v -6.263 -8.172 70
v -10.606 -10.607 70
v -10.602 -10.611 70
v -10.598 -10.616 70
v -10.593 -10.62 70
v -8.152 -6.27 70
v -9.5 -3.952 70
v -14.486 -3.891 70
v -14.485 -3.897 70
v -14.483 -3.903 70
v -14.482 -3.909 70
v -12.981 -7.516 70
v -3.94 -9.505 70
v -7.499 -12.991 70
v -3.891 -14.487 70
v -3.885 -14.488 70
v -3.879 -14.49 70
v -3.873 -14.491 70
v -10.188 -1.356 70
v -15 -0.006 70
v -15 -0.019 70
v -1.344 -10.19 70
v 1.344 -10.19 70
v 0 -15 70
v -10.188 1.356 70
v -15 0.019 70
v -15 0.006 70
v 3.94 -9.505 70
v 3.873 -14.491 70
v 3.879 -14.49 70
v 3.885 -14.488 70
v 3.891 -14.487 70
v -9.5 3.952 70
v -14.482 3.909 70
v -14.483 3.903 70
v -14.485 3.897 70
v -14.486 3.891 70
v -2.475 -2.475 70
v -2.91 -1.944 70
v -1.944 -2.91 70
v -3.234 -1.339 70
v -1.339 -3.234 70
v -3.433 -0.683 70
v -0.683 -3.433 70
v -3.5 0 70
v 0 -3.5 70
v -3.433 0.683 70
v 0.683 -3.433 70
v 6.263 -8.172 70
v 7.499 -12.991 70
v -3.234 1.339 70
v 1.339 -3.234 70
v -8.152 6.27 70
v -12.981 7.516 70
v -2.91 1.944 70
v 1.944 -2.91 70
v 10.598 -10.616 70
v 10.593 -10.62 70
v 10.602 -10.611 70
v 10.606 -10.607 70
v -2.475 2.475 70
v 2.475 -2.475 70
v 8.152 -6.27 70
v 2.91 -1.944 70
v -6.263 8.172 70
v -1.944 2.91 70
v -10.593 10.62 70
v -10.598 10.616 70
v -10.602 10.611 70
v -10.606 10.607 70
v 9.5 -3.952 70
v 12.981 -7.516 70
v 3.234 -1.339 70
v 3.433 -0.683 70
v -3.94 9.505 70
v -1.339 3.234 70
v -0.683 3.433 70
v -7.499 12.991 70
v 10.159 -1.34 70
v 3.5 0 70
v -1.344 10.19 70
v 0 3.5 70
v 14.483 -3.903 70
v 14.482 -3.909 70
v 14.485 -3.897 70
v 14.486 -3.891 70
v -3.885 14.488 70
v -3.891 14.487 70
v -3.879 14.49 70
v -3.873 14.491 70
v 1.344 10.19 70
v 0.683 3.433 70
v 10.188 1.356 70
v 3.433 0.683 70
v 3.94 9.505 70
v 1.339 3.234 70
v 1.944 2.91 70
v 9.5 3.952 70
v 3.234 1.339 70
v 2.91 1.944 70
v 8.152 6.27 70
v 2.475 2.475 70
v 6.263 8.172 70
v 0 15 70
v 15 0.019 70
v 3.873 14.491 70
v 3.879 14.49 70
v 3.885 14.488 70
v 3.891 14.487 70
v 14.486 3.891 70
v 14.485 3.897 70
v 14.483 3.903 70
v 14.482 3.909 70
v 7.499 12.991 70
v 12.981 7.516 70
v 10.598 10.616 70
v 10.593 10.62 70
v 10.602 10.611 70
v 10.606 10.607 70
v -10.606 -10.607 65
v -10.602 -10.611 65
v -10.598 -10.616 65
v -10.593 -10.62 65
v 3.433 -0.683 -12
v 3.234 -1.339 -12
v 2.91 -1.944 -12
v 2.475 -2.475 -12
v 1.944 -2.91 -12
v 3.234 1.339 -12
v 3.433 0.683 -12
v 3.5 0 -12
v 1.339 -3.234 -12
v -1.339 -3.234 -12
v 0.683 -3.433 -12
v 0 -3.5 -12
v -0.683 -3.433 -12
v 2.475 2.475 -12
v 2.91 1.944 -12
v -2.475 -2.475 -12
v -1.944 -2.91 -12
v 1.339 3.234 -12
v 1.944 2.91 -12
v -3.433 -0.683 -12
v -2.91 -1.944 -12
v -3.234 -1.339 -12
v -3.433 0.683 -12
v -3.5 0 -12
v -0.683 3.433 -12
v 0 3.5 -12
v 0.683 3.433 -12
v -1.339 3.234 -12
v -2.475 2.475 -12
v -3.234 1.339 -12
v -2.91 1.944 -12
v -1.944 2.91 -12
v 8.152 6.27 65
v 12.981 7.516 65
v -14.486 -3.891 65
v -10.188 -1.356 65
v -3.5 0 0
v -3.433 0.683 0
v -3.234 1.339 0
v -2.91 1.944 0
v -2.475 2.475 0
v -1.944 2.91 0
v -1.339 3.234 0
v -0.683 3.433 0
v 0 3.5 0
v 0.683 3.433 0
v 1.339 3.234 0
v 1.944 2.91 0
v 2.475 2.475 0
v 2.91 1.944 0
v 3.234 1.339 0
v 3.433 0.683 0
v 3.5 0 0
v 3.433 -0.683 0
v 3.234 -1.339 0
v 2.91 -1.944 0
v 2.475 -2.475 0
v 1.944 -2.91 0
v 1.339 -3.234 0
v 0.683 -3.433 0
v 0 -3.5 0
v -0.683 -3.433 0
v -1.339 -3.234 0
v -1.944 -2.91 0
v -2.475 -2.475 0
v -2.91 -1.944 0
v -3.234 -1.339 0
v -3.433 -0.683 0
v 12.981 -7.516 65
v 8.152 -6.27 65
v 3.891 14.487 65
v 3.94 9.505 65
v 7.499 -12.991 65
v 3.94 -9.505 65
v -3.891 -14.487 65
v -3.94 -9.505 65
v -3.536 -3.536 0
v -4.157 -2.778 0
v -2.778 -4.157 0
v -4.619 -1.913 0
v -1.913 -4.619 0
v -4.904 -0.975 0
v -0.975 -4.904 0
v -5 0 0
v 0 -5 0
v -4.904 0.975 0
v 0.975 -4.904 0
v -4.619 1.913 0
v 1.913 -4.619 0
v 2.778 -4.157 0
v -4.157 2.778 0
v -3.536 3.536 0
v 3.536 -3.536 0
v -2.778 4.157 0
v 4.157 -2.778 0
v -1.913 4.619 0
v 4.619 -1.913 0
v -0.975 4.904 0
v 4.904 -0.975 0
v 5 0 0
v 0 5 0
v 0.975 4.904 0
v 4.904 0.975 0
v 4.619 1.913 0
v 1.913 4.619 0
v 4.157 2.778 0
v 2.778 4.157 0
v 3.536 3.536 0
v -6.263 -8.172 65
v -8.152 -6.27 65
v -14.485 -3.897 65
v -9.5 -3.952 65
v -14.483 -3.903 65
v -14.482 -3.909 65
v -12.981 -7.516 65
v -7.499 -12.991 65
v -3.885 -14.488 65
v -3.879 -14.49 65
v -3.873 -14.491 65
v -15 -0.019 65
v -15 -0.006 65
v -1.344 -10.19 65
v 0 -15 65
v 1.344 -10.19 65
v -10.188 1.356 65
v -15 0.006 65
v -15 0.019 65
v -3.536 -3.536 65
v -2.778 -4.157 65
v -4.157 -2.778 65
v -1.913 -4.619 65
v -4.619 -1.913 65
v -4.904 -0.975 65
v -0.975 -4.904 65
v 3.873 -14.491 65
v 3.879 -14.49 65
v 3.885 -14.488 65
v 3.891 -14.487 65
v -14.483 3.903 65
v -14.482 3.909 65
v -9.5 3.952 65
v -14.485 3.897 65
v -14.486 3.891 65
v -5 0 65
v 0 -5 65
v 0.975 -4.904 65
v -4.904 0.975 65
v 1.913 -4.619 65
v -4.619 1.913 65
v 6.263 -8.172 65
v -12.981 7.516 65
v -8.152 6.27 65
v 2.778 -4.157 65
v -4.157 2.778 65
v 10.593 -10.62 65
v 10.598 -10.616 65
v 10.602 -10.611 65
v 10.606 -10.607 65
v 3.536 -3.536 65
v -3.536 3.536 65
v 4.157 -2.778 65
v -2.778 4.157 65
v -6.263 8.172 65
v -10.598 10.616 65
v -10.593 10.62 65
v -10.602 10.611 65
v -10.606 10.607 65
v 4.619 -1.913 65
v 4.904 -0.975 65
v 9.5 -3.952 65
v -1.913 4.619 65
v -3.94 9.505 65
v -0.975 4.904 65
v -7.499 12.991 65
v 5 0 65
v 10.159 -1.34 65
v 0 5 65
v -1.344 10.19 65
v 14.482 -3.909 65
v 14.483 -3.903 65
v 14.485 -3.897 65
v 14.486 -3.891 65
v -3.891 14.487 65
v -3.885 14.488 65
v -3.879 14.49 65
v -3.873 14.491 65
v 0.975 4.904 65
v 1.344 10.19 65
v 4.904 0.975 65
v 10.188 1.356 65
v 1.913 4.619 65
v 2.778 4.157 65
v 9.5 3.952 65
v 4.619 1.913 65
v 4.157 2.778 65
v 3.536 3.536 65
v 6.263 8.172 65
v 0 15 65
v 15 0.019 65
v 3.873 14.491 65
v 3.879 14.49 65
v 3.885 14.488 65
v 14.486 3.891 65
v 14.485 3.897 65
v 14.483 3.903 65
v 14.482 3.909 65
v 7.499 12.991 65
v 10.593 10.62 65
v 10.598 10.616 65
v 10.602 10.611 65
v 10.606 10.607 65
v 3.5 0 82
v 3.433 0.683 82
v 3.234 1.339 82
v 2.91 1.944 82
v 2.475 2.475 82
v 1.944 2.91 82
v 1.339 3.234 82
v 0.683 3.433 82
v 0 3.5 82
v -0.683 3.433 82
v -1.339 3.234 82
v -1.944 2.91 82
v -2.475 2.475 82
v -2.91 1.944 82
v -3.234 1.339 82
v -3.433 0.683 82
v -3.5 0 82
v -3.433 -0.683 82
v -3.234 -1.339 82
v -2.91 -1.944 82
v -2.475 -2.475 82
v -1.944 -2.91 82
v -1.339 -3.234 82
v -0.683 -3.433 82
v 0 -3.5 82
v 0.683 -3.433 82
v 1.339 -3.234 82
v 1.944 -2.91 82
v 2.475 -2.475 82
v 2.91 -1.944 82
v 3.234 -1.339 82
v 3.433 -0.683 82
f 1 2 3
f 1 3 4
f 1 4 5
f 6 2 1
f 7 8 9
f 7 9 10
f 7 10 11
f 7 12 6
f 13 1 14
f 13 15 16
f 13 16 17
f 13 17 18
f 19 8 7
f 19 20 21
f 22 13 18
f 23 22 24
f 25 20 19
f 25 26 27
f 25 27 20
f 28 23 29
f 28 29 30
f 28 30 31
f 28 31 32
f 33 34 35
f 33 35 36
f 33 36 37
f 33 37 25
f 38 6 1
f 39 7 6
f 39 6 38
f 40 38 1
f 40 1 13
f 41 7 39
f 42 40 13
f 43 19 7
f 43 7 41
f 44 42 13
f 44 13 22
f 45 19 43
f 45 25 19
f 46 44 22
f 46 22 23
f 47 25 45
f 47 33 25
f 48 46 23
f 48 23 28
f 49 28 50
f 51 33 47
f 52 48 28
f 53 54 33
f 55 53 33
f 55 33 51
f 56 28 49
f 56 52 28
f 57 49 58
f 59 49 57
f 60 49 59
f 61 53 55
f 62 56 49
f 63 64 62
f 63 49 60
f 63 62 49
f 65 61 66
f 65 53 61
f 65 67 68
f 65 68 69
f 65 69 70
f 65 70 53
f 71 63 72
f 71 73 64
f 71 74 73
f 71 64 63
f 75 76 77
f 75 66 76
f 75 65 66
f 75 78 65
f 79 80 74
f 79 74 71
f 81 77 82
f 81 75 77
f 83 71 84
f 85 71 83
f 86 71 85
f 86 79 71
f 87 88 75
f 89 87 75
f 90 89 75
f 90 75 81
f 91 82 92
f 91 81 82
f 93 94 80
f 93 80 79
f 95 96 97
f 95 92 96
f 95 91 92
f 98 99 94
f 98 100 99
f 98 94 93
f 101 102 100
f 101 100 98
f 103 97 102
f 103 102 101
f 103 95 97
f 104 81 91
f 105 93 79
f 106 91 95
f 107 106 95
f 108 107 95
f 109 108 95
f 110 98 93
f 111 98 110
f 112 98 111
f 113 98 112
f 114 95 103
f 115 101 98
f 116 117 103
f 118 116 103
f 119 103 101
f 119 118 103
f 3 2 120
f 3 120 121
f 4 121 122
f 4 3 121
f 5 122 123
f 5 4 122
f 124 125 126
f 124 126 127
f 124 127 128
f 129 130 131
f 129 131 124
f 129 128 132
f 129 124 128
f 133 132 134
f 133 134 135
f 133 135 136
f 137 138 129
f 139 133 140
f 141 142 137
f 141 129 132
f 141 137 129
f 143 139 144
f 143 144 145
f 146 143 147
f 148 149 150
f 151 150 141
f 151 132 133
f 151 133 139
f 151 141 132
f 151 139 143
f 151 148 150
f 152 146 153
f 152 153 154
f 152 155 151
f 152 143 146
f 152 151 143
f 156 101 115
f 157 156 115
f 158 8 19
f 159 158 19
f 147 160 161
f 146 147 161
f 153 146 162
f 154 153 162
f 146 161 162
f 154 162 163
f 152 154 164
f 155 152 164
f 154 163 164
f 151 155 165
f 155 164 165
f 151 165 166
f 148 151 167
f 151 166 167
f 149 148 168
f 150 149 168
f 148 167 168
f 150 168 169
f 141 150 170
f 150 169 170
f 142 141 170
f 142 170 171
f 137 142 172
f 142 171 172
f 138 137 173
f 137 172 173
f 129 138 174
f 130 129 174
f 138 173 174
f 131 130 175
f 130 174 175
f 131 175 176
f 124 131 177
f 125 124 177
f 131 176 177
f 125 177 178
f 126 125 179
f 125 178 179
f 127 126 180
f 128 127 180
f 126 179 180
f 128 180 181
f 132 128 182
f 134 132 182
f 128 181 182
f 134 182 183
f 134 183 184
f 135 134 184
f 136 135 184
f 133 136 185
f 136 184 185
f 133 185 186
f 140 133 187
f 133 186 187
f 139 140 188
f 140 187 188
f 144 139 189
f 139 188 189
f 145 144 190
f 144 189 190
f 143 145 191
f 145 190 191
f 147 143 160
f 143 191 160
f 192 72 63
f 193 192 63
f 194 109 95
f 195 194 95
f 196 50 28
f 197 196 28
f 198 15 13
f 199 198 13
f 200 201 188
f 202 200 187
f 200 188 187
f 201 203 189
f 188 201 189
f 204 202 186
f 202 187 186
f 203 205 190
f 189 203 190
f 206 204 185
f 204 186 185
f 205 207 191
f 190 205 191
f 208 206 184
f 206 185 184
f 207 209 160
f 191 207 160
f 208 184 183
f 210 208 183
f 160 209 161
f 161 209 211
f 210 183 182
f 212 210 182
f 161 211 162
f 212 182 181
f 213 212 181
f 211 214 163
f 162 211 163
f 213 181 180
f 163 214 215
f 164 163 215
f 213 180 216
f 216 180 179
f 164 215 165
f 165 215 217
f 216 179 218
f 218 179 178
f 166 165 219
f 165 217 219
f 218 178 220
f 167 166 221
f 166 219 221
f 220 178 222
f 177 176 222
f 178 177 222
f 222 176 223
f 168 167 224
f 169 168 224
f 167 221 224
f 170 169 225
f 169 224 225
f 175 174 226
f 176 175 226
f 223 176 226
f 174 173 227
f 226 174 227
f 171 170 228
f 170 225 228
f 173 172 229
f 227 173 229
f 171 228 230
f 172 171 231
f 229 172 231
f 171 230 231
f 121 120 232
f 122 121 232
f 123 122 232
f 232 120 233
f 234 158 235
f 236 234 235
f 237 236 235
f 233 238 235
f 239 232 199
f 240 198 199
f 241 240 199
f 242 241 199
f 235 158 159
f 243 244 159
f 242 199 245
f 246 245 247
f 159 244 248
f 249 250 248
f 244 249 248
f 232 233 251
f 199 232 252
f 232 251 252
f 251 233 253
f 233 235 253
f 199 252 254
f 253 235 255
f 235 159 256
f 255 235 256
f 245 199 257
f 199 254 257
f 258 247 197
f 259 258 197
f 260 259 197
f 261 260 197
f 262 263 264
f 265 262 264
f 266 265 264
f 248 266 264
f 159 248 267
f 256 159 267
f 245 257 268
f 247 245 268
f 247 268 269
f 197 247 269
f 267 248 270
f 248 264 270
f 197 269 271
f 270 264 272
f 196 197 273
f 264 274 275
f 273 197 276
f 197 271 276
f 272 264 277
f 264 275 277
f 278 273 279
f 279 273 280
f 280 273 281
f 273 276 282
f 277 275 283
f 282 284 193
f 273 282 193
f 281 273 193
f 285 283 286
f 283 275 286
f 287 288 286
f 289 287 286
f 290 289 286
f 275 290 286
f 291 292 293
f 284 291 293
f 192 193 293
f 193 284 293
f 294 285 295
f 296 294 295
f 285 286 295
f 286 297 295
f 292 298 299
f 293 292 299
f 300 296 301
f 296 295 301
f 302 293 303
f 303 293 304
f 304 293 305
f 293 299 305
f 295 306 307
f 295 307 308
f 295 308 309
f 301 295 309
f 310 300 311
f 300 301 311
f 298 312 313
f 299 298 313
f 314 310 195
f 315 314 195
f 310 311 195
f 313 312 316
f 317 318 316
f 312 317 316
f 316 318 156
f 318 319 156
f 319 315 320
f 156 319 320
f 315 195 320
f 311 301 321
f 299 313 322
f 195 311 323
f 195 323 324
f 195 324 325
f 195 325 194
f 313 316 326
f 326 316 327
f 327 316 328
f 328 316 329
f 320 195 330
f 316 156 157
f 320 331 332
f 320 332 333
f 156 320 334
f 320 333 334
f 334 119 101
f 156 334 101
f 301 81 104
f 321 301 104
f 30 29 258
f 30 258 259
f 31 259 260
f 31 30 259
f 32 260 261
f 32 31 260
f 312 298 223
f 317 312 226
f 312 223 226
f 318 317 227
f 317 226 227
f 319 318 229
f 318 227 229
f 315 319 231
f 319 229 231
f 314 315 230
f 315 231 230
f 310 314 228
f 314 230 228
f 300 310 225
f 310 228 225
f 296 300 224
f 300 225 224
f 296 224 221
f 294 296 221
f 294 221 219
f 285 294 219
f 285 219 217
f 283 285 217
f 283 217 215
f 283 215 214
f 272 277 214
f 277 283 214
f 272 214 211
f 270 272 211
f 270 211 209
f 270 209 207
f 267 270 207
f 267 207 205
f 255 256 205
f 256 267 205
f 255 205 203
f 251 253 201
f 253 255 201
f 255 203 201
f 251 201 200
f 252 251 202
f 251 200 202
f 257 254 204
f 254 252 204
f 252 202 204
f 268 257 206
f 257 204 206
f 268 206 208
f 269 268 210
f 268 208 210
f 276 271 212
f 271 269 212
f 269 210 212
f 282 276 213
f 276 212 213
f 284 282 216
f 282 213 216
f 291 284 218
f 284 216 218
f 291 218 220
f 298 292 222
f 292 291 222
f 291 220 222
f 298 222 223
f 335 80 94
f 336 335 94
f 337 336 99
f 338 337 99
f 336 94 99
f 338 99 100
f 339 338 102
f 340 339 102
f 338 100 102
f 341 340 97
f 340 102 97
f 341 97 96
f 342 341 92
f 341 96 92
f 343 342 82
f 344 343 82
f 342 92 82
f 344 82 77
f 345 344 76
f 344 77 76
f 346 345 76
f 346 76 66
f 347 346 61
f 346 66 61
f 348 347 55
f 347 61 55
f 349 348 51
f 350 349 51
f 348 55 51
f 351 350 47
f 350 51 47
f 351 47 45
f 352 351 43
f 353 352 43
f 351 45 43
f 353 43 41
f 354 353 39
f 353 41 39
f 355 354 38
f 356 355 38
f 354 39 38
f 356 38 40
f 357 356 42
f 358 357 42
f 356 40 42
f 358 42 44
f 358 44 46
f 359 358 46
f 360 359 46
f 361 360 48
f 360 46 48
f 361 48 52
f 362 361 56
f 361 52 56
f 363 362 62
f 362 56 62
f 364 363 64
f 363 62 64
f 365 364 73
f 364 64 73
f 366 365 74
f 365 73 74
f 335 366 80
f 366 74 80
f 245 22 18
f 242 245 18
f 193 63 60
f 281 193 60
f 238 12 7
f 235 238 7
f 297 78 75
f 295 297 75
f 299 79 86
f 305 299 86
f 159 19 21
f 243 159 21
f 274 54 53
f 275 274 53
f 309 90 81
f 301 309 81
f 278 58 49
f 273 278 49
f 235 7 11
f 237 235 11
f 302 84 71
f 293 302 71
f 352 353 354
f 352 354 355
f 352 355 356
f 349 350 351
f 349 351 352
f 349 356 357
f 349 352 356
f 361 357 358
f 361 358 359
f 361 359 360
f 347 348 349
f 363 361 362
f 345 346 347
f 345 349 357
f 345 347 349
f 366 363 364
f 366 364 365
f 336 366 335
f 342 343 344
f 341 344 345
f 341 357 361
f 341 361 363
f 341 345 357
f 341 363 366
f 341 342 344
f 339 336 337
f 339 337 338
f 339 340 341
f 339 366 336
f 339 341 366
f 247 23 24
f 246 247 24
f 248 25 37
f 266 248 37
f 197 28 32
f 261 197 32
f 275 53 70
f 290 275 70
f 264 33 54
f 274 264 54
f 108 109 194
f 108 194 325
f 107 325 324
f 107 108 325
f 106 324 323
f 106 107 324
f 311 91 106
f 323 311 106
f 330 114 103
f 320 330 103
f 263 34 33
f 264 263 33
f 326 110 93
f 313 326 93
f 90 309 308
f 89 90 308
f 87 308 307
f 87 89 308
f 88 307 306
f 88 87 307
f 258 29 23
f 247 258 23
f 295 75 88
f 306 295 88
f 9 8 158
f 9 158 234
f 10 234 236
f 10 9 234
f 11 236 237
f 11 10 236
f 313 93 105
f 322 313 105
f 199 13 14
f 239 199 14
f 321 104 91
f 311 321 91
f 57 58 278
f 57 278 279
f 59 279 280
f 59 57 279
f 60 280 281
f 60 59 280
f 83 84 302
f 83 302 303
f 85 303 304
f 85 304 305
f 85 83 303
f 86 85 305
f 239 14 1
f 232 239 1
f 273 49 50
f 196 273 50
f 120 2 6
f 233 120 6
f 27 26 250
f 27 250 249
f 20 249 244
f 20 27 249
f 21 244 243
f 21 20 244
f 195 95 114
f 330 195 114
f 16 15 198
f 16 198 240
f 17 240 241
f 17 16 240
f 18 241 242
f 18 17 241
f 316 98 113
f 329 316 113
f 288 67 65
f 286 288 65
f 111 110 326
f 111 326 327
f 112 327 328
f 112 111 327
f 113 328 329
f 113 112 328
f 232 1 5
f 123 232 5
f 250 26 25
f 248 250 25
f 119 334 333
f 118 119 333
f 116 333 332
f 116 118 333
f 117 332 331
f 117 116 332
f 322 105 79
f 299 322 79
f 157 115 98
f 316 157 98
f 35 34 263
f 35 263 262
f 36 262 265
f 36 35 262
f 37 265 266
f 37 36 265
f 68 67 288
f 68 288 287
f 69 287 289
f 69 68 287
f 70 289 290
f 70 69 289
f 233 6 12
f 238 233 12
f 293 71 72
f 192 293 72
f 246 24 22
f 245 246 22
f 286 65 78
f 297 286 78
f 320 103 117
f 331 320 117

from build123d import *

# Parameters (mm, degrees)
ESQUISSE1_R             = 5
BOSS_EXTRU_2_DEPTH      = 70
ESQUISSE2_R             = 3.5
BOSS_EXTRU_3_DEPTH      = 12
ESQUISSE4_R             = 15
BOSS_EXTRU_5_DEPTH      = 5
ESQUISSE5_R             = 3.5
BOSS_EXTRU_6_DEPTH      = 12
ENL_V_MAT_EXTRU_1_DEPTH = 12


with BuildPart() as part:
    # Esquisse1 → Boss.-Extru.2 (new body)
    with BuildSketch(Plane.XY):
        Circle(ESQUISSE1_R)
    extrude(amount=BOSS_EXTRU_2_DEPTH)

    # Esquisse2 → Boss.-Extru.3 (add)
    with BuildSketch(Plane(origin=(0, 0, 0), x_dir=(-1, 0, 0), z_dir=(0, 0, -1))):
        Circle(ESQUISSE2_R)
    extrude(amount=BOSS_EXTRU_3_DEPTH)

    # Esquisse4 → Boss.-Extru.5 (add)
    with BuildSketch(Plane.XY.offset(70)):
        Circle(ESQUISSE4_R)
    extrude(amount=-BOSS_EXTRU_5_DEPTH)

    # Esquisse5 → Boss.-Extru.6 (add)
    with BuildSketch(Plane.XY.offset(70)):
        Circle(ESQUISSE5_R)
    extrude(amount=BOSS_EXTRU_6_DEPTH)

    # Esquisse6 → Enlèv. mat.-Extru.1 (cut)
    with BuildSketch(Plane.XY.offset(70)):
        with BuildLine():
            Line((-6.262893089, 8.172072336), (-7.499435292, 12.990707074))
            ThreePointArc((-7.499435292, 12.990707074), (-9.123657799, 11.90625333), (-10.593218546, 10.619968024))
            Line((-10.593218546, 10.619968024), (-6.262893089, 8.172072336))
        make_face()
        with BuildLine():
            Line((-8.152402023, 6.270263162), (-10.606442664, 10.606760769))
            ThreePointArc((-10.606442664, 10.606760769), (-11.894621233, 9.138817524), (-12.981158937, 7.515950549))
            Line((-12.981158937, 7.515950549), (-8.152402023, 6.270263162))
        make_face()
        with BuildLine():
            Line((-9.499942261, 3.951679007), (-12.981158937, 7.515950549))
            ThreePointArc((-12.981158937, 7.515950549), (-13.849269023, 5.761748652), (-14.481582106, 3.909447494))
            Line((-14.481582106, 3.909447494), (-9.499942261, 3.951679007))
        make_face()
        with BuildLine():
            Line((-10.188028074, 1.356459322), (-14.486441985, 3.891400598))
            ThreePointArc((-14.486441985, 3.891400598), (-14.869805294, 1.972027008), (-14.999987869, 0.0190767))
            Line((-14.999987869, 0.0190767), (-10.188028074, 1.356459322))
        make_face()
        with BuildLine():
            ThreePointArc((-14.999987869, -0.0190767), (-14.869805294, -1.972027008), (-14.486441985, -3.891400598))
            Line((-14.486441985, -3.891400598), (-10.188028074, -1.356459322))
            Line((-10.188028074, -1.356459322), (-14.999987869, -0.0190767))
        make_face()
        with BuildLine():
            Line((-9.499942261, -3.951679007), (-14.481582106, -3.909447494))
            ThreePointArc((-14.481582106, -3.909447494), (-13.849269023, -5.761748652), (-12.981158937, -7.515950549))
            Line((-12.981158937, -7.515950549), (-9.499942261, -3.951679007))
        make_face()
        with BuildLine():
            Line((-8.152402023, -6.270263162), (-12.981158937, -7.515950549))
            ThreePointArc((-12.981158937, -7.515950549), (-11.894621233, -9.138817524), (-10.606442664, -10.606760769))
            Line((-10.606442664, -10.606760769), (-8.152402023, -6.270263162))
        make_face()
        with BuildLine():
            Line((-6.262893089, -8.172072336), (-10.593218546, -10.619968024))
            ThreePointArc((-10.593218546, -10.619968024), (-9.123657799, -11.90625333), (-7.499435292, -12.990707074))
            Line((-7.499435292, -12.990707074), (-6.262893089, -8.172072336))
        make_face()
        with BuildLine():
            Line((-3.939593974, -9.504960245), (-7.499435292, -12.990707074))
            ThreePointArc((-7.499435292, -12.990707074), (-5.744130769, -13.8565855), (-3.891026946, -14.486542352))
            Line((-3.891026946, -14.486542352), (-3.939593974, -9.504960245))
        make_face()
        with BuildLine():
            Line((-1.343501295, -10.189744953), (-3.872973884, -14.491379275))
            ThreePointArc((-3.872973884, -14.491379275), (-1.953114292, -14.872301253), (0, -15))
            Line((0, -15), (-1.343501295, -10.189744953))
        make_face()
        with BuildLine():
            ThreePointArc((0, -15), (1.953114292, -14.872301253), (3.872973884, -14.491379275))
            Line((3.872973884, -14.491379275), (1.343501295, -10.189744953))
            Line((1.343501295, -10.189744953), (0, -15))
        make_face()
        with BuildLine():
            ThreePointArc((3.891026946, -14.486542352), (5.744130769, -13.8565855), (7.499435292, -12.990707074))
            Line((7.499435292, -12.990707074), (3.939593974, -9.504960245))
            Line((3.939593974, -9.504960245), (3.891026946, -14.486542352))
        make_face()
        with BuildLine():
            ThreePointArc((7.499435292, -12.990707074), (9.123657799, -11.90625333), (10.593218546, -10.619968024))
            Line((10.593218546, -10.619968024), (6.262893089, -8.172072336))
            Line((6.262893089, -8.172072336), (7.499435292, -12.990707074))
        make_face()
        with BuildLine():
            ThreePointArc((10.606442664, -10.606760769), (11.894621233, -9.138817524), (12.981158937, -7.515950549))
            Line((12.981158937, -7.515950549), (8.152402023, -6.270263162))
            Line((8.152402023, -6.270263162), (10.606442664, -10.606760769))
        make_face()
        with BuildLine():
            ThreePointArc((12.981158937, -7.515950549), (13.849269023, -5.761748652), (14.481582106, -3.909447494))
            Line((14.481582106, -3.909447494), (9.499942261, -3.951679007))
            Line((9.499942261, -3.951679007), (12.981158937, -7.515950549))
        make_face()
        with BuildLine():
            ThreePointArc((15, 0), (14.999996967, 0.009538352), (14.999987869, 0.0190767))
            Line((14.999987869, 0.0190767), (10.159352957, -1.339548494))
            Line((10.159352957, -1.339548494), (14.486441985, -3.891400598))
            ThreePointArc((14.486441985, -3.891400598), (14.87105628, -1.962571047), (15, 0))
        make_face()
        with BuildLine():
            ThreePointArc((14.999987869, 0.0190767), (14.869805294, 1.972027008), (14.486441985, 3.891400598))
            Line((14.486441985, 3.891400598), (10.188028074, 1.356459322))
            Line((10.188028074, 1.356459322), (14.999987869, 0.0190767))
        make_face()
        with BuildLine():
            ThreePointArc((14.481582106, 3.909447494), (13.849269023, 5.761748652), (12.981158937, 7.515950549))
            Line((12.981158937, 7.515950549), (9.499942261, 3.951679007))
            Line((9.499942261, 3.951679007), (14.481582106, 3.909447494))
        make_face()
        with BuildLine():
            ThreePointArc((12.981158937, 7.515950549), (11.894621233, 9.138817524), (10.606442664, 10.606760769))
            Line((10.606442664, 10.606760769), (8.152402023, 6.270263162))
            Line((8.152402023, 6.270263162), (12.981158937, 7.515950549))
        make_face()
        with BuildLine():
            ThreePointArc((10.593218546, 10.619968024), (9.123657799, 11.90625333), (7.499435292, 12.990707074))
            Line((7.499435292, 12.990707074), (6.262893089, 8.172072336))
            Line((6.262893089, 8.172072336), (10.593218546, 10.619968024))
        make_face()
        with BuildLine():
            ThreePointArc((7.499435292, 12.990707074), (5.744130769, 13.8565855), (3.891026946, 14.486542352))
            Line((3.891026946, 14.486542352), (3.939593974, 9.504960245))
            Line((3.939593974, 9.504960245), (7.499435292, 12.990707074))
        make_face()
        with BuildLine():
            ThreePointArc((3.872973884, 14.491379275), (1.953114292, 14.872301253), (0, 15))
            Line((0, 15), (1.343501295, 10.189744953))
            Line((1.343501295, 10.189744953), (3.872973884, 14.491379275))
        make_face()
        with BuildLine():
            Line((-1.343501295, 10.189744953), (0, 15))
            ThreePointArc((0, 15), (-1.953114292, 14.872301253), (-3.872973884, 14.491379275))
            Line((-3.872973884, 14.491379275), (-1.343501295, 10.189744953))
        make_face()
        with BuildLine():
            Line((-3.939593974, 9.504960245), (-3.891026946, 14.486542352))
            ThreePointArc((-3.891026946, 14.486542352), (-5.744130769, 13.8565855), (-7.499435292, 12.990707074))
            Line((-7.499435292, 12.990707074), (-3.939593974, 9.504960245))
        make_face()
    extrude(amount=-ENL_V_MAT_EXTRU_1_DEPTH, mode=Mode.SUBTRACT)


solid = part.part
